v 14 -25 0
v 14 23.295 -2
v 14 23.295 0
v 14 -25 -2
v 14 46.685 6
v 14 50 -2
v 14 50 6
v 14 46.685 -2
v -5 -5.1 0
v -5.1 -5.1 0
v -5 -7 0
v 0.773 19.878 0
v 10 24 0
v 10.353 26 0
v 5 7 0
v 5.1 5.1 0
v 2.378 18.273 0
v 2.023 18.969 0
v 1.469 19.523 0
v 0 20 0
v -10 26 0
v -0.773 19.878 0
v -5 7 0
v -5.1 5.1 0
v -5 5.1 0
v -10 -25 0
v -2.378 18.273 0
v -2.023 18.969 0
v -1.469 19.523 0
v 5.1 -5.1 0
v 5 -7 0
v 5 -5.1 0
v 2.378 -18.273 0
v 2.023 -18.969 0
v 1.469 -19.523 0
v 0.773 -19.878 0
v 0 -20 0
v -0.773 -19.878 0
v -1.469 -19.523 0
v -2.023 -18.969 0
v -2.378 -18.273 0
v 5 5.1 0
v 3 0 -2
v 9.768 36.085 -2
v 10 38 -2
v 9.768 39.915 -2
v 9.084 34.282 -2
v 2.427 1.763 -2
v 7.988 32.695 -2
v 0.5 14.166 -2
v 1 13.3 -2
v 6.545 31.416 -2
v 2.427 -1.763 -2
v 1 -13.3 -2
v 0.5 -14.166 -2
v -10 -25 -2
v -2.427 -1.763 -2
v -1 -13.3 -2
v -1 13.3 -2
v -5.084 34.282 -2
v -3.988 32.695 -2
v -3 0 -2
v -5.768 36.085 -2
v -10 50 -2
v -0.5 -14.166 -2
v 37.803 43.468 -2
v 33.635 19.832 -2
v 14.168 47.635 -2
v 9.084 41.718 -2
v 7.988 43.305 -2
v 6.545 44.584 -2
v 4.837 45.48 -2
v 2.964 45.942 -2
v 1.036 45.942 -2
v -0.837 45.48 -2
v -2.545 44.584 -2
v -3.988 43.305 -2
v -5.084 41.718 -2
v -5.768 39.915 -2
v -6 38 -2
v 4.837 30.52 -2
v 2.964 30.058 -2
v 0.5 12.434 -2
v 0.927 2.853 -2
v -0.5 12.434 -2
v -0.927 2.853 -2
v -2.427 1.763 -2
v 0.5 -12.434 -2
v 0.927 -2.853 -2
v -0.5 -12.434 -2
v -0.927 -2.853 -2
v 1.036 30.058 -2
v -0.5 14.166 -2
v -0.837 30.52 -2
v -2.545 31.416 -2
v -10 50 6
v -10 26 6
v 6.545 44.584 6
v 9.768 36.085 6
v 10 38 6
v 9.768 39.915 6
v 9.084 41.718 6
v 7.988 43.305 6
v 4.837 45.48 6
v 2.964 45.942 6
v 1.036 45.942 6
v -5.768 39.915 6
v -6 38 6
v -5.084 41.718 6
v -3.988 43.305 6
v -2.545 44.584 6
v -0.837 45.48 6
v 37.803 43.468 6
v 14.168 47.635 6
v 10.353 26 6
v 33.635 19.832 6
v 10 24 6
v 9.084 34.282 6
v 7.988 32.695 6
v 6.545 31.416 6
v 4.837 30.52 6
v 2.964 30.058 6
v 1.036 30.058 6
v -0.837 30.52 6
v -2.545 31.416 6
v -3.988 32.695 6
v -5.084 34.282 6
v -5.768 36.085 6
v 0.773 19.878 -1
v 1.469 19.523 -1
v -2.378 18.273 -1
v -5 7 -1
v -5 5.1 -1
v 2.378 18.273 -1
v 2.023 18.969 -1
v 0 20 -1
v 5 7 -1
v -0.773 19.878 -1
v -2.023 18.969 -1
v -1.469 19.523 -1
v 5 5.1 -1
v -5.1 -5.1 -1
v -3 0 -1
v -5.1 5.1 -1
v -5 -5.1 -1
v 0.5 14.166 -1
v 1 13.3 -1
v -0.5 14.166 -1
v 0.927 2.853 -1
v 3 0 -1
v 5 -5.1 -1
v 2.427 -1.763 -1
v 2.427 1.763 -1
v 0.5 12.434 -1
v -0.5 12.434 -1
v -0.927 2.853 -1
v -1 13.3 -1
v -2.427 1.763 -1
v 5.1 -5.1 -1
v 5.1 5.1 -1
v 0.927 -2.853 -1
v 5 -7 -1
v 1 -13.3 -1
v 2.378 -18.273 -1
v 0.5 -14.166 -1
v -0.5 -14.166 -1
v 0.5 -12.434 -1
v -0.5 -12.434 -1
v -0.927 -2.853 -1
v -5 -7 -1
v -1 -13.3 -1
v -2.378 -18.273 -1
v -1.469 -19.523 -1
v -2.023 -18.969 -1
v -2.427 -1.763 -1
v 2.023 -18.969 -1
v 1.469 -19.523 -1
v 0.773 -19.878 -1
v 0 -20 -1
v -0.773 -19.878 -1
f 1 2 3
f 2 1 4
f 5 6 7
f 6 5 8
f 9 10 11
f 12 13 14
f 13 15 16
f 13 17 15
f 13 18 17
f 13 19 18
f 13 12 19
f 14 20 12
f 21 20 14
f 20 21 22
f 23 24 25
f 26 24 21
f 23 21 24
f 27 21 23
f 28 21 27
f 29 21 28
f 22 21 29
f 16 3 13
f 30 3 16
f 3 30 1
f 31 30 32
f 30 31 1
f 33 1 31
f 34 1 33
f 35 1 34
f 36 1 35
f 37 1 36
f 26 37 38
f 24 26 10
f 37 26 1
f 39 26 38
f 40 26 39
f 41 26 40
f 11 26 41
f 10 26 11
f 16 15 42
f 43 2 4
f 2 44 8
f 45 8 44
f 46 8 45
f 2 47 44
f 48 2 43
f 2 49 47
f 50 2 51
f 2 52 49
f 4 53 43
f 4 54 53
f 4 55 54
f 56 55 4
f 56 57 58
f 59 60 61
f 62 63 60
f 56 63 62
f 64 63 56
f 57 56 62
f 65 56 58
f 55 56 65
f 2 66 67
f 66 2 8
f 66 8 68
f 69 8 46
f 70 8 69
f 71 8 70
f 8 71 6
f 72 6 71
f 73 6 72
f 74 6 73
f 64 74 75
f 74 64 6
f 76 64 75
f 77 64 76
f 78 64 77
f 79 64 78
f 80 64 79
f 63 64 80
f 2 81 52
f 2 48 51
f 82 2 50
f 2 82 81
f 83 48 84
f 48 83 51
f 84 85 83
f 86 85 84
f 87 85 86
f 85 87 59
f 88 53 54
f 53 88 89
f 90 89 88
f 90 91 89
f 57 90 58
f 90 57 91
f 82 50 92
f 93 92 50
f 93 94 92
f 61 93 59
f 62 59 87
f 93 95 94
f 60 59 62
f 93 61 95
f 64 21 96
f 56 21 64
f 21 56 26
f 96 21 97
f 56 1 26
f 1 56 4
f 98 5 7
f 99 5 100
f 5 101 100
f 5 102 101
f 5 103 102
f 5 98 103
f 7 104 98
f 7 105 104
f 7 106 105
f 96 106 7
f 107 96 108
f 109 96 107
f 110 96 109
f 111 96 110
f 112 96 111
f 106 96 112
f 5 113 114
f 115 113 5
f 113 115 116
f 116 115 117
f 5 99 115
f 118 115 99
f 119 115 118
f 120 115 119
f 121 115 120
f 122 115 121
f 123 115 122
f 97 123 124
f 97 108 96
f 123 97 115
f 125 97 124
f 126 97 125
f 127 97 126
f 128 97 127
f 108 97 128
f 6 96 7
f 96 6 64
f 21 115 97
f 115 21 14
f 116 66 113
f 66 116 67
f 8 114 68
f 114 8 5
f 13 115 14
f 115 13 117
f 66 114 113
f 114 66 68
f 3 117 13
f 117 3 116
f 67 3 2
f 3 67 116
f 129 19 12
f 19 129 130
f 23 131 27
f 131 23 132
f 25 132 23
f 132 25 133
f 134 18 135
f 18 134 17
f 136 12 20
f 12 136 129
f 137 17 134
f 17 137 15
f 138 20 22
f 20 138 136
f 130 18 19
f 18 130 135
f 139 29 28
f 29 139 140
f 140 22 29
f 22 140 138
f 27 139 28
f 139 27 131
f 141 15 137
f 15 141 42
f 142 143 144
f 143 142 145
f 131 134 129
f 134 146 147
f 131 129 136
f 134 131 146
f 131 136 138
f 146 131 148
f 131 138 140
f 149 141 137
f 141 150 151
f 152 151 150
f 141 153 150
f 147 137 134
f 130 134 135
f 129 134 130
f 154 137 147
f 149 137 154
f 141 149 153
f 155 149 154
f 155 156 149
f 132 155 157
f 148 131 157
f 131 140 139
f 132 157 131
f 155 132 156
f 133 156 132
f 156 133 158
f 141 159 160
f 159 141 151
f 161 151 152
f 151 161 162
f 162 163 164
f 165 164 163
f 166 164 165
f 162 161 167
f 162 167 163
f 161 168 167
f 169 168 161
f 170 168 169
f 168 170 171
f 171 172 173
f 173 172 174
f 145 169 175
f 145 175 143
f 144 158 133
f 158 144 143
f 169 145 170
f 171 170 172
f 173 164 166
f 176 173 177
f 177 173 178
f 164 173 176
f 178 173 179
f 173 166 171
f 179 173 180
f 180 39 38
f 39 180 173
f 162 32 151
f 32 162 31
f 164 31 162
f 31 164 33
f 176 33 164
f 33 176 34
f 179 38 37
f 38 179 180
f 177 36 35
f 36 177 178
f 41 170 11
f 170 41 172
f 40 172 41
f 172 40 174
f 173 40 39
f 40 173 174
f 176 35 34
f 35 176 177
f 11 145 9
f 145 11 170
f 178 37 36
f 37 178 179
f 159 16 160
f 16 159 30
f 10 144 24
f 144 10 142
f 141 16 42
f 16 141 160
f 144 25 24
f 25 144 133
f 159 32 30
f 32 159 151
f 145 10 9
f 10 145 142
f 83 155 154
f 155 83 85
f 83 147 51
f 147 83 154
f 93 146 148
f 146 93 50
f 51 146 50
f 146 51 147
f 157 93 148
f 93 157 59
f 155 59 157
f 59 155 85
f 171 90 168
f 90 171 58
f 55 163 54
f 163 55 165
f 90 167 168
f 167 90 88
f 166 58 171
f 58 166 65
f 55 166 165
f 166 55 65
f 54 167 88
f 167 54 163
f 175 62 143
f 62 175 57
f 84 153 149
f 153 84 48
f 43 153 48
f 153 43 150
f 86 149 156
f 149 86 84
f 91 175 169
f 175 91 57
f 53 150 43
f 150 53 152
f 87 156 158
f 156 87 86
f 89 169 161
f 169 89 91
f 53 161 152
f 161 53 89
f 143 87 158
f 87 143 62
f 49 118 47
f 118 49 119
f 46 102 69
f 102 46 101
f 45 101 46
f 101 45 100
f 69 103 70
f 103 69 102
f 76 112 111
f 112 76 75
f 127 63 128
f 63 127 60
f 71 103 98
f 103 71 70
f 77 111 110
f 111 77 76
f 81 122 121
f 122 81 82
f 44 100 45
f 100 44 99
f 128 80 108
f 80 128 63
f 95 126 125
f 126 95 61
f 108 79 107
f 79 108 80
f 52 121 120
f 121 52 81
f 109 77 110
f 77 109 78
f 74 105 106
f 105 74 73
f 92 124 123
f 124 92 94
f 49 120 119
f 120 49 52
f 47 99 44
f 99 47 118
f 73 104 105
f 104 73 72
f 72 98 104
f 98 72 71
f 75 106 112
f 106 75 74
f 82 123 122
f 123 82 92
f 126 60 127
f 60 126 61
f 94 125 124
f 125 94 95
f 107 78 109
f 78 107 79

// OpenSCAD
// file: constants.scad
//-------------------------------------------------------------
//-- Futaba Horn from Servo wheel by Juan Gonzalez (obijuan) juan@iearobotics.com
//-------------------------------------------------------------

//-- Wheel parameters
wheel_or_idiam = 50;                   //-- O-ring inner diameter
wheel_or_diam = 1;                     //-- O-ring section diameter
wheel_height = 2*wheel_or_diam+0;     //-- Wheel height: change the 0 for 
                                      //-- other value (0 equals minimun height)
//-- Parameters common to all horns
horn_drill_diam = 2;
horn_height = 8;        //-- Total height: shaft + plate
horn_plate_height = 2;  //-- plate height

//-- Futaba 3003 servo rounded horn parameters
rh_diam1 = 8.5;  //-- Rounded horn small diameter
rh_diam2 = 24; //-- Rounded horn big diameter
rounded_horn_drill_distance = 7.3;

//-- Futaba 3003 4-arm horn parameters
a4h_end_diam = 5;
a4h_center_diam = 10;
a4h_arm_length = 15;
a4h_drill_distance = 13.3;

//-- Pill parameters
pill_diam = 16;
pill_height = 8;
pill_holder = pill_diam * 1.5;

length = 70;
// main file
include <constants.scad>;

//--------------------------------------------------------------
//-- Generic module for the horn's drills
//-- Parameters:
//--  d = drill's radial distance (from the horn's center)
//--  n = number of drills
//--  h = wheel height
//--------------------------------------------------------------
module horn_drills(d,n,h)
{
  union() {
    for ( i = [0 : n-1] ) {
        rotate([0,0,i*360/n])
        translate([0,d,0])
        cylinder(r=horn_drill_diam/2, h=h+10,center=true, $fn=6);  
      }
  }
}

//-----------------------------------------
//-- Futaba 3003 horn4 arm
//-- This module is just one arm
//-----------------------------------------
module horn4_arm(h=5)
{
  translate([0,a4h_arm_length-a4h_end_diam/2,0])
  //-- The arm consist of the perimeter of a cylinder and a cube
  hull() {
    cylinder(r=a4h_end_diam/2, h=h, center=true, $fn=20);
    translate([0,1-a4h_arm_length+a4h_end_diam/2,0])
      cube([a4h_center_diam,2,h],center=true);
  }
}

//-------------------------------------------
//-- Futaba 3003 4-arm horn
//-------------------------------------------
module horn4(h=5)
{
  union() {
    //-- Center part (is a square)
    cube([a4h_center_diam+0.2,a4h_center_diam+0.2,h],center=true);

    //-- Place the 4 arms in every side of the cube
    for ( i = [0 : 1] ) {
      rotate( [0,0,i*180])
      translate([0, a4h_center_diam/2, 0])
      horn4_arm(h);
    }
  }

}

//-------------------------------------------------------
//--  A Wheel for the futaba 3003 4-arm horns
//--------------------------------------------------------
module Servo_wheel_4_arm_horn()
{
  difference() {
      raw_wheel(or_idiam=wheel_or_idiam, or_diam=wheel_or_diam, h=wheel_height);

      //-- Inner drill
      cylinder(center=true, h=2*wheel_height + 10, r=a4h_center_diam/2,$fn=20);

      //-- substract the 4-arm servo horn
      translate([0,0,horn_height-horn_plate_height])
        horn4(h=wheel_height);

      //-- Horn drills
      horn_drills(d=a4h_drill_distance, n=4, h=wheel_height);

  }
}

difference() {
//	minkowski() {
		union() {
			// Bottom plate
			translate([-a4h_center_diam, -a4h_center_diam - a4h_arm_length, -wheel_height])
				cube([pill_holder, length, wheel_height]);

			// Hole plate
			translate([-a4h_center_diam, length - a4h_center_diam - a4h_arm_length - pill_holder + 5, -wheel_height])
				cube([pill_holder, pill_holder, pill_height]);

			// Filler plate
			translate([-a4h_center_diam + pill_holder - 4, length - a4h_center_diam - a4h_arm_length - pill_holder + 3, -wheel_height])				
				rotate([0, 0, -10])
					cube([pill_holder, pill_holder, pill_height]);				
		}
//		sphere(r=2, $fn=40);
//	}			

	// Horn hole
	horn4(h=wheel_height);
	horn_drills(d=a4h_drill_distance, n=2, h=wheel_height);
	translate([0, 0, -wheel_height * 2])
		cylinder(h=wheel_height * 2, r=3);

	// Pill hole
	translate([2, 38, -pill_height])
		cylinder(h=pill_height * 2, r=pill_diam / 2);
}
	
